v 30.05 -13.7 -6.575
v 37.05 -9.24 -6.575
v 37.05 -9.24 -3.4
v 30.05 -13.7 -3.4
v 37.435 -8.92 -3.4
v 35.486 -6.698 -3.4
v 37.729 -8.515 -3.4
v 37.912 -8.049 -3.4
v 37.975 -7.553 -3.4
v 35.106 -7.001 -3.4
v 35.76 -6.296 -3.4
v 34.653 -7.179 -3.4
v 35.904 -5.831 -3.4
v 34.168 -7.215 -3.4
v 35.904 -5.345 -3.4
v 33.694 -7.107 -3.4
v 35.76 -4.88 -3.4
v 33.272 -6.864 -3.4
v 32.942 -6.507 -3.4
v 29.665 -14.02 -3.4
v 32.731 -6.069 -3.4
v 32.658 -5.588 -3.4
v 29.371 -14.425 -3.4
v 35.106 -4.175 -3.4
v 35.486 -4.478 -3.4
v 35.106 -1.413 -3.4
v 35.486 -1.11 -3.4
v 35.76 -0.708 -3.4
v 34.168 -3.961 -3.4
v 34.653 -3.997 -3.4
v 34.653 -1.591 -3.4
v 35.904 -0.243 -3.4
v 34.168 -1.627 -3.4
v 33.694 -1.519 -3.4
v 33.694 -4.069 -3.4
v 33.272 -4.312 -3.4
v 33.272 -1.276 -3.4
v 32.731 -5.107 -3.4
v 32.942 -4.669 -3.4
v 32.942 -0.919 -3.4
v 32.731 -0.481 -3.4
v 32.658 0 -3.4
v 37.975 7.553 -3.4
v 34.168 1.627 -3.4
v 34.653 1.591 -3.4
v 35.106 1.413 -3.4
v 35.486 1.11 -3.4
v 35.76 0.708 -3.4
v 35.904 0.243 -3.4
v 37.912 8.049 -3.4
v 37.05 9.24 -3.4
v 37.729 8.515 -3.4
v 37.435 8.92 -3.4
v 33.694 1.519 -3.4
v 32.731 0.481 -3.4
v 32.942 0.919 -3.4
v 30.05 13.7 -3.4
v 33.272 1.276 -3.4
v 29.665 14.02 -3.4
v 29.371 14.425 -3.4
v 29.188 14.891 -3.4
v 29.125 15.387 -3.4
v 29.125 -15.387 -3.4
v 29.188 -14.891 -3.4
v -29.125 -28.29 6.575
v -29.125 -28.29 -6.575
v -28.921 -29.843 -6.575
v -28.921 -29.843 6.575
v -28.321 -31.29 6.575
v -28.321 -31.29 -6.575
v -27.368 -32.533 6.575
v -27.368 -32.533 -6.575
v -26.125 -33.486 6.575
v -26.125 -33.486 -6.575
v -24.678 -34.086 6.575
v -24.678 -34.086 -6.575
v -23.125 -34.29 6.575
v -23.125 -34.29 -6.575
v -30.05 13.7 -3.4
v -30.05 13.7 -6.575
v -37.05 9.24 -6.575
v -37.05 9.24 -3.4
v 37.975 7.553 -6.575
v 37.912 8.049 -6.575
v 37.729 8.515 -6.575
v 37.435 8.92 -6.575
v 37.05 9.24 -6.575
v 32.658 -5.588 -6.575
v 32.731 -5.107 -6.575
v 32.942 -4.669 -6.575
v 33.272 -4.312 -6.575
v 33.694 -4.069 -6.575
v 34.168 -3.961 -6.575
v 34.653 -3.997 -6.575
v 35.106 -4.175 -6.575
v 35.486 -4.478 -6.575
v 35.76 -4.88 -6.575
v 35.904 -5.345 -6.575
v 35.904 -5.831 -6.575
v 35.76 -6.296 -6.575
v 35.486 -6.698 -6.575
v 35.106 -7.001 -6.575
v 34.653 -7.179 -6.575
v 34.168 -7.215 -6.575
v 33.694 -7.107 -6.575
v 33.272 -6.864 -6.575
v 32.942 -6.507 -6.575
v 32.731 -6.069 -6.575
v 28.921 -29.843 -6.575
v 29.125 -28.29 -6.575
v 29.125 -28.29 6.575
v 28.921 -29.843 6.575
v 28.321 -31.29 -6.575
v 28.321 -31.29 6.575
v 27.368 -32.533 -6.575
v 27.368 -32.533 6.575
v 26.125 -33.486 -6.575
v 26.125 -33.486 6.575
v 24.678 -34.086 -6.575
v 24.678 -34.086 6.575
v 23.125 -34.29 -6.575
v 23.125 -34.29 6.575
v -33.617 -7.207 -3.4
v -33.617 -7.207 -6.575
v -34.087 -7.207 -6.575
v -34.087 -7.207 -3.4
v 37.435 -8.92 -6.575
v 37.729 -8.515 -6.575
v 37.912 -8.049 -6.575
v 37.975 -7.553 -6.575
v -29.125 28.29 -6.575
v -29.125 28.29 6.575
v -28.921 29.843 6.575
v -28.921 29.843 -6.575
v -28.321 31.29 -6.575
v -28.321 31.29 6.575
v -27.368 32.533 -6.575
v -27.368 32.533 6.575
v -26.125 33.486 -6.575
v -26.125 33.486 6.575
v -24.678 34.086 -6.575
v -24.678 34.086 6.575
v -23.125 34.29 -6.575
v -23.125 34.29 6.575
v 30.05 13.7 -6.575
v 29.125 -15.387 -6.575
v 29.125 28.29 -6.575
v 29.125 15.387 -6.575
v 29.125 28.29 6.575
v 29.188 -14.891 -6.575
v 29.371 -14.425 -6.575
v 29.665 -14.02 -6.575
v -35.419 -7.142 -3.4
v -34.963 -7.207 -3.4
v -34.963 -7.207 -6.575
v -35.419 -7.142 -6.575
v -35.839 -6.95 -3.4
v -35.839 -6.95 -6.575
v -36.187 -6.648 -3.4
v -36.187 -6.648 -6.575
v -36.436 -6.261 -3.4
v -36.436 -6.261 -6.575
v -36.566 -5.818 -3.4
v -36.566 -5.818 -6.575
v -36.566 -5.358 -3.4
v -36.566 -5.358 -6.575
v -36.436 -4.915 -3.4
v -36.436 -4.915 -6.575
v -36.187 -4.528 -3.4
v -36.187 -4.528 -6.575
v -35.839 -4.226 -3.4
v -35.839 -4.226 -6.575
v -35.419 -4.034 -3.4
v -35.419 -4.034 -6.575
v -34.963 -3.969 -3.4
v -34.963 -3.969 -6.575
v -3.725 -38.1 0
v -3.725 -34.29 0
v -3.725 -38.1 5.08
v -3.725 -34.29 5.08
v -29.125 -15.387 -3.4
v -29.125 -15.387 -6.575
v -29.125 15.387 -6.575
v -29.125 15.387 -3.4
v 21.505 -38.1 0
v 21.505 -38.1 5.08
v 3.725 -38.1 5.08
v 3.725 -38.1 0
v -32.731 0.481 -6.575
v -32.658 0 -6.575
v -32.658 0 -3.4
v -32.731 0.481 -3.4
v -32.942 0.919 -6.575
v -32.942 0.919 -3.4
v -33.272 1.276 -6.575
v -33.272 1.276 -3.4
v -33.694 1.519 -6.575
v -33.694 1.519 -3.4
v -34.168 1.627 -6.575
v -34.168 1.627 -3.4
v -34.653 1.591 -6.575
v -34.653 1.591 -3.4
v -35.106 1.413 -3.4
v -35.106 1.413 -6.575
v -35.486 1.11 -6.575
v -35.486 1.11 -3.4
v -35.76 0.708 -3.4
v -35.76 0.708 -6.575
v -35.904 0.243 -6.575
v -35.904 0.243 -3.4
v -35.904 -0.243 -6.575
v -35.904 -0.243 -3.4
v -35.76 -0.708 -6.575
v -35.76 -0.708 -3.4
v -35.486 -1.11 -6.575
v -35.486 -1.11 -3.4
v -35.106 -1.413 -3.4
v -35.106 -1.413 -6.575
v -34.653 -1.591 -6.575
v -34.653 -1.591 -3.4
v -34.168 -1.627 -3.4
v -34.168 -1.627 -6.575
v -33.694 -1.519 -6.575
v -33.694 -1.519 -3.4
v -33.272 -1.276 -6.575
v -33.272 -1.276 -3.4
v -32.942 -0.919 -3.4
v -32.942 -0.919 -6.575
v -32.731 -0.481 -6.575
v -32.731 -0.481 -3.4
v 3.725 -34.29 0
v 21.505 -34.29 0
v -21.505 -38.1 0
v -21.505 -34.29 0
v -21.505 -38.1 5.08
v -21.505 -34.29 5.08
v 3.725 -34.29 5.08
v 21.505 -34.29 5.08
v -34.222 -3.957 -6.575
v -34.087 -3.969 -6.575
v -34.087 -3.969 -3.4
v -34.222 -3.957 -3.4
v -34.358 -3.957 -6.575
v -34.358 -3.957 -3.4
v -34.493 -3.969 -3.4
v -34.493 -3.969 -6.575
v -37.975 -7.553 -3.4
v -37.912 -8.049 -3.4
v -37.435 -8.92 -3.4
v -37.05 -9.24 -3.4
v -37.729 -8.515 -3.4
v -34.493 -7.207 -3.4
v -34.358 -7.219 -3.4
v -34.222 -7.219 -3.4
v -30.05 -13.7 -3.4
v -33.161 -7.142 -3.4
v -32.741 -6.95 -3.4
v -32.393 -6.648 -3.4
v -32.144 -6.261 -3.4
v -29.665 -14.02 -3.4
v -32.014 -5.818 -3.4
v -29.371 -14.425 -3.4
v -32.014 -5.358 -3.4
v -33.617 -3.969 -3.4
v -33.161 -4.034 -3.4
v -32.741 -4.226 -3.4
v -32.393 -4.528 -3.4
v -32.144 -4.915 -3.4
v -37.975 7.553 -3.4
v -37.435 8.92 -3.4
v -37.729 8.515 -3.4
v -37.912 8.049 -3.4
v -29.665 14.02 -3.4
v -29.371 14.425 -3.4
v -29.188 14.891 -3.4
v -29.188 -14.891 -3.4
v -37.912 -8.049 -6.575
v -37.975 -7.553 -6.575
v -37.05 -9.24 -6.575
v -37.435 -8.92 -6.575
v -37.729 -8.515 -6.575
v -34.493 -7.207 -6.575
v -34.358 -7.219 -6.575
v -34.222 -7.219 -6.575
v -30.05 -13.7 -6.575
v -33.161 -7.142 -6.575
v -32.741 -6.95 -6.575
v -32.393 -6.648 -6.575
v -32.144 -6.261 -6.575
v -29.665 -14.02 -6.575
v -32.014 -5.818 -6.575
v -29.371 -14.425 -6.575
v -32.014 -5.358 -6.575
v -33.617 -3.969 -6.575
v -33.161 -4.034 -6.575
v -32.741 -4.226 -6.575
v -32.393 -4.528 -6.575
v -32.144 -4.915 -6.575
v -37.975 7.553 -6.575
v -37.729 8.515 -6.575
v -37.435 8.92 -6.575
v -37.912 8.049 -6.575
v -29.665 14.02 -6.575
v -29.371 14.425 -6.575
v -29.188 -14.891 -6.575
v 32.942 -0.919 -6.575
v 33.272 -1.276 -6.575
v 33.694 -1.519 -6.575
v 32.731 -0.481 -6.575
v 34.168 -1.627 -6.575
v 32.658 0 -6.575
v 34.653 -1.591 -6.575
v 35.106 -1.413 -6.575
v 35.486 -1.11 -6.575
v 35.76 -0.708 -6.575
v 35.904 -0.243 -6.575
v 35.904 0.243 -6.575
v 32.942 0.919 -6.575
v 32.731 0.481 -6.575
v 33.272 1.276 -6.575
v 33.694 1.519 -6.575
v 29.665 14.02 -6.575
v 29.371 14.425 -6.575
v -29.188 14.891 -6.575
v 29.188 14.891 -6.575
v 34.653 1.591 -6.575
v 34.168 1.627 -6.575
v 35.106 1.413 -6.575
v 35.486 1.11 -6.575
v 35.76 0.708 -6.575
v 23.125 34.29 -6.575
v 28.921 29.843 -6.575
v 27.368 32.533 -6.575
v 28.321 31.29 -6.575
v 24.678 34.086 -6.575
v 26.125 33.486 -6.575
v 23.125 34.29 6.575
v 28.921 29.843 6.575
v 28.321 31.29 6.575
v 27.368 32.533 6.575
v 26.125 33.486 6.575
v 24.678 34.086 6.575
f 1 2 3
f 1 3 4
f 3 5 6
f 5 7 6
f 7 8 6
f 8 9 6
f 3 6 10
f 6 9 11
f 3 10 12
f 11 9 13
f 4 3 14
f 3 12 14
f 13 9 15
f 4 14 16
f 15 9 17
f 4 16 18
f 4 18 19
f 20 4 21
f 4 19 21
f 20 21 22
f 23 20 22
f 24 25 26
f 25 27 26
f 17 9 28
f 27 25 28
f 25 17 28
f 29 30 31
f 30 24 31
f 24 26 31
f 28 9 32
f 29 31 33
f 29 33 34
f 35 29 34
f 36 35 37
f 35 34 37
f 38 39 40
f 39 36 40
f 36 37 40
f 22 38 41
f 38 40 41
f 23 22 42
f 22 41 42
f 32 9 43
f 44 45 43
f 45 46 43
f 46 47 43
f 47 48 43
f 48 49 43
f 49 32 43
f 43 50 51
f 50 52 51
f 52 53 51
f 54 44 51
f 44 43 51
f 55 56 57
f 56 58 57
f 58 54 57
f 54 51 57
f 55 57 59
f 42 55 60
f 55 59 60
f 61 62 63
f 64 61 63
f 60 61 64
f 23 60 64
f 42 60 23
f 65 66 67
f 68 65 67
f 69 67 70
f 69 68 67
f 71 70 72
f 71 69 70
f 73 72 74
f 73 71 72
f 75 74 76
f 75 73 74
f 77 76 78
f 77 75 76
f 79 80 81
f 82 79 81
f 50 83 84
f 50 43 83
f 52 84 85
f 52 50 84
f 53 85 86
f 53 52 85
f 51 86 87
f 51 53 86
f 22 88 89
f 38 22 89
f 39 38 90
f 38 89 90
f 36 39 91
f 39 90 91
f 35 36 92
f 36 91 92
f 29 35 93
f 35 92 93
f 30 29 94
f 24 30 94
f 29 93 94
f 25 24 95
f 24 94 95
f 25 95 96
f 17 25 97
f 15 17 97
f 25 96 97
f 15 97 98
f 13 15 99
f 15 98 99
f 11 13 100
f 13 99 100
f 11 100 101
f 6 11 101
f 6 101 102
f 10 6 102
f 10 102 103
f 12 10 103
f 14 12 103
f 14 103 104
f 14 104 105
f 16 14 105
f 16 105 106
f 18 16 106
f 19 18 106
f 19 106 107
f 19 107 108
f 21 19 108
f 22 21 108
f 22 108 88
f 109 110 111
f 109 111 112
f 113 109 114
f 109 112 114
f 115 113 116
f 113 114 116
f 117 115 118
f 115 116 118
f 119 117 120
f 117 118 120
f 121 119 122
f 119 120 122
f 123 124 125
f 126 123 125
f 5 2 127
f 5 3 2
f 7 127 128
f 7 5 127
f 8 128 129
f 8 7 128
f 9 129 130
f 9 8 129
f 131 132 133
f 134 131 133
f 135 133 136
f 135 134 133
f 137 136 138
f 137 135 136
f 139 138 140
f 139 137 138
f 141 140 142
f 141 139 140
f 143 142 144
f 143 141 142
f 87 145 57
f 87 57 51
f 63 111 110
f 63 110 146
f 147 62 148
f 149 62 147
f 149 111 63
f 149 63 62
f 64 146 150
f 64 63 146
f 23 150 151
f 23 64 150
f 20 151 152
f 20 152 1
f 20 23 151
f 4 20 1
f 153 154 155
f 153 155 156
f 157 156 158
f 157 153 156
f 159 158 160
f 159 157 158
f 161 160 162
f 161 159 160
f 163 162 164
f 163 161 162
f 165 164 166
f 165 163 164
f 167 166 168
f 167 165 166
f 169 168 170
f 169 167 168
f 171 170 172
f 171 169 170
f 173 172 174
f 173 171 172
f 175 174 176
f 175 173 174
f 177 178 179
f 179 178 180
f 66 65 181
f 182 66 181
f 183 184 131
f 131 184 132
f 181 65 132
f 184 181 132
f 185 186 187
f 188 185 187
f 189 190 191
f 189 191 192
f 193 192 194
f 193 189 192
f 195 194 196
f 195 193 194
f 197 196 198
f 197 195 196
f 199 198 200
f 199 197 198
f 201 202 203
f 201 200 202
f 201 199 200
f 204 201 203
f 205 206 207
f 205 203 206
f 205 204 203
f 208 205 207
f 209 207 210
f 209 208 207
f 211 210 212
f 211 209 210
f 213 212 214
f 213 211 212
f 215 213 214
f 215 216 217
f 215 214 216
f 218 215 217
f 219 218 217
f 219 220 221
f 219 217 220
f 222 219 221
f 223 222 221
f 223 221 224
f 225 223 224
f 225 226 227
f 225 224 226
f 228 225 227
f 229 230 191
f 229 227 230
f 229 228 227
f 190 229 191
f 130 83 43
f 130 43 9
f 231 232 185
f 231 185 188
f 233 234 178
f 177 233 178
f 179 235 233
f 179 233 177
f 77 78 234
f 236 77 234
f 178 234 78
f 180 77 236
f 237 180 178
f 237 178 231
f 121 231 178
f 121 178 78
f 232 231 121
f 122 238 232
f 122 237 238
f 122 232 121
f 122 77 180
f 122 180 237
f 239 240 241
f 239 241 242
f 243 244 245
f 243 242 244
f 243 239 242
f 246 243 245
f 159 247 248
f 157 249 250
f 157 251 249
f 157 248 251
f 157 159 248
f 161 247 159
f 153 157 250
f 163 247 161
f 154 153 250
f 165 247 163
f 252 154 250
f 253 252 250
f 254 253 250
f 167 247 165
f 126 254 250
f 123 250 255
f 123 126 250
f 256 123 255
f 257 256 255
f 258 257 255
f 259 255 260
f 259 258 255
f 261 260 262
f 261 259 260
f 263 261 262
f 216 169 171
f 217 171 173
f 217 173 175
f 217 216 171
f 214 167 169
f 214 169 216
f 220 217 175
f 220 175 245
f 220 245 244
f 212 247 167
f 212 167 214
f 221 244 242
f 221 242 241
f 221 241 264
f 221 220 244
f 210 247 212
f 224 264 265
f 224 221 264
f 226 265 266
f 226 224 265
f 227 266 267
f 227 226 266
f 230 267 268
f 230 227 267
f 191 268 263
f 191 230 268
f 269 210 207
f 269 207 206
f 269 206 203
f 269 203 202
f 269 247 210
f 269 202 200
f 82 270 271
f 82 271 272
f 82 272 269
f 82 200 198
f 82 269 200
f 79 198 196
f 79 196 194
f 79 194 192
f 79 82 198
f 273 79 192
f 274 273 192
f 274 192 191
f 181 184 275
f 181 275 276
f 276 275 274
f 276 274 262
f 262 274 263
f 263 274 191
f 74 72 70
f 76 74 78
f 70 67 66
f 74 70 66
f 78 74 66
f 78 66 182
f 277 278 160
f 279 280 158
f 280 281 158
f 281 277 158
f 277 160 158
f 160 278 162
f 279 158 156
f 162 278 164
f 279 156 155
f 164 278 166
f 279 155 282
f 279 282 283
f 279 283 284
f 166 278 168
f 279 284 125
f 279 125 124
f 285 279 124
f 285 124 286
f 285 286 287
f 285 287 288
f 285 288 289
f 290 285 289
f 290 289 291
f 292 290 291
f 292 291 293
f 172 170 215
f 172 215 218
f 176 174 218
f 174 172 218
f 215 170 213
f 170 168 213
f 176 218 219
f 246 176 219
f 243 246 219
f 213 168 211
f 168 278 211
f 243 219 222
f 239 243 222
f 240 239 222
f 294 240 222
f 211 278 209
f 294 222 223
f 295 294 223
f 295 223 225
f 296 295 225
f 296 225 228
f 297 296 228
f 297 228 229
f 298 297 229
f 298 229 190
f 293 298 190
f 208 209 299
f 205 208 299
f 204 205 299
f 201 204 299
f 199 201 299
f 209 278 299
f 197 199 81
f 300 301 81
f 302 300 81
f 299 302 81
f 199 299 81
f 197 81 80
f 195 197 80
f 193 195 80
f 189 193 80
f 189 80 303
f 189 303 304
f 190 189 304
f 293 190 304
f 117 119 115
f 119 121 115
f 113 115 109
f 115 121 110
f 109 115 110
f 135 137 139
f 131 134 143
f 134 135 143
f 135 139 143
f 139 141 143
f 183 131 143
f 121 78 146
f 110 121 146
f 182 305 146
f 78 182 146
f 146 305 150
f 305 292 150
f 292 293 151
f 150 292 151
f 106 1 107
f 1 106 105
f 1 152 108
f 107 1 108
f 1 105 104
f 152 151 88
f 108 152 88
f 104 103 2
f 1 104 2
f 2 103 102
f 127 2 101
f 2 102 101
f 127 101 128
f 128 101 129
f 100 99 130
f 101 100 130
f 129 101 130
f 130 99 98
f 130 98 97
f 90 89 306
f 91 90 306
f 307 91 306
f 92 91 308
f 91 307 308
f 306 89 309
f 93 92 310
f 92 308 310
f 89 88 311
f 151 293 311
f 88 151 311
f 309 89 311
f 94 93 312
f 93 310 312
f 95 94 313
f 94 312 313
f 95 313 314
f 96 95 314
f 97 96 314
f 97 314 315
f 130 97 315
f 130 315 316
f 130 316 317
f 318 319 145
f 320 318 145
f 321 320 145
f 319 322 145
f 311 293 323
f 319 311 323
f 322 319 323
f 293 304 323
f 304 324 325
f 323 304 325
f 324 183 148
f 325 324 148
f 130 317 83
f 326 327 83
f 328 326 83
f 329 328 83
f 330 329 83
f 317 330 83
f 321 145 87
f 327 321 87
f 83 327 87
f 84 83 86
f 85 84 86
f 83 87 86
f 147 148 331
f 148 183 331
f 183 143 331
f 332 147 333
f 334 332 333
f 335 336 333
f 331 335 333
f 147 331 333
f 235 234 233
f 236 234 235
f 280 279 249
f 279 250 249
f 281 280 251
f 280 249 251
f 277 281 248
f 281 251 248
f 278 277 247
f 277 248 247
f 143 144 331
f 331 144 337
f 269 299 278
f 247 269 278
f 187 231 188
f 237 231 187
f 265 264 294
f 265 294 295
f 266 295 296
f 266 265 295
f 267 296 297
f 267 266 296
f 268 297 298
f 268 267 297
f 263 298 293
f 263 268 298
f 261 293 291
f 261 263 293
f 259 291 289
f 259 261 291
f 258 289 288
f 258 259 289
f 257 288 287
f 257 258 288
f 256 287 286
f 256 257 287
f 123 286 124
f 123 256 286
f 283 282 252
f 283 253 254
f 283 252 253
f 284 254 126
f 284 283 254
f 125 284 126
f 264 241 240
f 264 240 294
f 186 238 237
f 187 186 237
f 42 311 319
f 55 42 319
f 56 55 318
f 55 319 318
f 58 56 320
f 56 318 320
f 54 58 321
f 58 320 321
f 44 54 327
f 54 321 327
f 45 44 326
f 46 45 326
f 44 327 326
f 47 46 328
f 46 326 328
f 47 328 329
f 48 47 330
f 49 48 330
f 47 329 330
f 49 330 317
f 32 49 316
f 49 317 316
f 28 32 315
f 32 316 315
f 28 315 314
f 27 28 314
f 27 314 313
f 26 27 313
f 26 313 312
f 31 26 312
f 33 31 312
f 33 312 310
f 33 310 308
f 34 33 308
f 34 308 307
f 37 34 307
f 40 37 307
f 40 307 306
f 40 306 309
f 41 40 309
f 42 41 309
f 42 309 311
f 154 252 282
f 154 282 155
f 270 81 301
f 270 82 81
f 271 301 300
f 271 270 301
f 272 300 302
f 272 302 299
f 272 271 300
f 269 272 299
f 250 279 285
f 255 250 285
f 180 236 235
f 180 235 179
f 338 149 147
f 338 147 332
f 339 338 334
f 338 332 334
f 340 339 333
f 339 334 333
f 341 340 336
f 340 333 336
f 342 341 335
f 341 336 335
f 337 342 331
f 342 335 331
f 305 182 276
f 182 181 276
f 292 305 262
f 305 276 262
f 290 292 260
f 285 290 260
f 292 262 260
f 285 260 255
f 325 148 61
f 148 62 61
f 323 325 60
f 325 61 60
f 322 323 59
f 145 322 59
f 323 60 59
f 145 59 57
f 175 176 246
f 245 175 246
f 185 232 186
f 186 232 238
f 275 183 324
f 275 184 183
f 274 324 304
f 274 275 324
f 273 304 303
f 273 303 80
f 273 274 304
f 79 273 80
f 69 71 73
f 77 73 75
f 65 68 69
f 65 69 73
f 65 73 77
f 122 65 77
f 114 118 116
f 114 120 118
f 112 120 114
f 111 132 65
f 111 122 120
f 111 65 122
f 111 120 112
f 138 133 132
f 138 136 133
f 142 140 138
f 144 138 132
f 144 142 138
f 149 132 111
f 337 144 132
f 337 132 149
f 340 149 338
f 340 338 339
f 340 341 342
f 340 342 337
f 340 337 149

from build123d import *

# Parameters (mm, degrees)
SKETCH1_W                    = 58.25
SKETCH1_H                    = 68.58
BOSS_EXTRUDE1_DEPTH          = 6.575
FILLET1_R                    = 6
BOSS_EXTRUDE2_DEPTH          = 3.175
SKETCH6_W                    = 17.78
SKETCH6_H                    = 5.08
BOSS_EXTRUDE3_DEPTH          = 3.81
F_30_0_1285_DIAMETER_HOLE1_D = 3.2639
FILLET2_R                    = 2
CUT_EXTRUDE1_DEPTH           = 55.710248126


with BuildPart() as part:
    # Sketch1 → Boss-Extrude1 (new, symmetric)
    with BuildSketch(Plane.XY):
        Rectangle(SKETCH1_W, SKETCH1_H)
    extrude(amount=BOSS_EXTRUDE1_DEPTH, both=True)

    # Fillet1
    fillet1_edges = [part.edges().sort_by_distance(p)[0] for p in [
        (29.125, -34.29, 0),
        (-29.125, -34.29, 0),
        (-29.125, 34.29, 0),
        (29.125, 34.29, 0),
    ]]
    fillet(fillet1_edges, radius=FILLET1_R)

    # Sketch2 → Boss-Extrude2 (add)
    with BuildSketch(Plane(origin=(0, 0, -6.575), x_dir=(-1, 0, 0), z_dir=(0, 0, -1))):
        Polygon((-29.125, 14.29), (-37.975, 8.65), (-37.975, -8.65), (-29.125, -14.29), align=None)
    boss_extrude2 = extrude(amount=-BOSS_EXTRUDE2_DEPTH)

    # Sketch6 → Boss-Extrude3 (add)
    with BuildSketch(Plane.XZ.offset(34.29)):
        with Locations((-12.615, 2.54)):
            Rectangle(SKETCH6_W, SKETCH6_H)
    boss_extrude3 = extrude(amount=BOSS_EXTRUDE3_DEPTH)

    # #30 (0.1285) Diameter Hole1 (through all)
    with Locations(Plane.XY.offset(-3.4)):
        with Locations((34.29, 0), (34.29, -5.588)):
            f_30_0_1285_diameter_hole1 = Hole(F_30_0_1285_DIAMETER_HOLE1_D / 2)

    # Mirror1: Boss-Extrude2, Boss-Extrude3, #30 (0.1285) Diameter Hole1 across plane
    add(boss_extrude2.mirror(Plane(origin=(0, 0, 0), x_dir=(0, 0, 1), z_dir=(1, 0, 0))))
    add(boss_extrude3.mirror(Plane(origin=(0, 0, 0), x_dir=(0, 0, 1), z_dir=(1, 0, 0))))
    add(f_30_0_1285_diameter_hole1.mirror(Plane(origin=(0, 0, 0), x_dir=(0, 0, 1), z_dir=(1, 0, 0))), mode=Mode.SUBTRACT)

    # Fillet2
    fillet2_edges = [part.edges().sort_by_distance(p)[0] for p in [
        (29.125, 14.29, -4.9875),
        (29.125, -14.29, -4.9875),
        (37.975, -8.65, -4.9875),
        (37.975, 8.65, -4.9875),
        (-29.125, -14.29, -4.9875),
        (-29.125, 14.29, -4.9875),
        (-37.975, 8.65, -4.9875),
        (-37.975, -8.65, -4.9875),
    ]]
    fillet(fillet2_edges, radius=FILLET2_R)

    # Sketch5 → Cut-Extrude1 (cut, through all)
    with BuildSketch(Plane.XY.offset(-3.4)):
        with BuildLine():
            Line((-33.6169, -7.20725), (-34.9631, -7.20725))
            ThreePointArc((-34.9631, -7.20725), (-36.58235, -5.588), (-34.9631, -3.96875))
            Line((-34.9631, -3.96875), (-33.6169, -3.96875))
            ThreePointArc((-33.6169, -3.96875), (-31.99765, -5.588), (-33.6169, -7.20725))
        make_face()
    extrude(amount=-CUT_EXTRUDE1_DEPTH, mode=Mode.SUBTRACT)


solid = part.part
